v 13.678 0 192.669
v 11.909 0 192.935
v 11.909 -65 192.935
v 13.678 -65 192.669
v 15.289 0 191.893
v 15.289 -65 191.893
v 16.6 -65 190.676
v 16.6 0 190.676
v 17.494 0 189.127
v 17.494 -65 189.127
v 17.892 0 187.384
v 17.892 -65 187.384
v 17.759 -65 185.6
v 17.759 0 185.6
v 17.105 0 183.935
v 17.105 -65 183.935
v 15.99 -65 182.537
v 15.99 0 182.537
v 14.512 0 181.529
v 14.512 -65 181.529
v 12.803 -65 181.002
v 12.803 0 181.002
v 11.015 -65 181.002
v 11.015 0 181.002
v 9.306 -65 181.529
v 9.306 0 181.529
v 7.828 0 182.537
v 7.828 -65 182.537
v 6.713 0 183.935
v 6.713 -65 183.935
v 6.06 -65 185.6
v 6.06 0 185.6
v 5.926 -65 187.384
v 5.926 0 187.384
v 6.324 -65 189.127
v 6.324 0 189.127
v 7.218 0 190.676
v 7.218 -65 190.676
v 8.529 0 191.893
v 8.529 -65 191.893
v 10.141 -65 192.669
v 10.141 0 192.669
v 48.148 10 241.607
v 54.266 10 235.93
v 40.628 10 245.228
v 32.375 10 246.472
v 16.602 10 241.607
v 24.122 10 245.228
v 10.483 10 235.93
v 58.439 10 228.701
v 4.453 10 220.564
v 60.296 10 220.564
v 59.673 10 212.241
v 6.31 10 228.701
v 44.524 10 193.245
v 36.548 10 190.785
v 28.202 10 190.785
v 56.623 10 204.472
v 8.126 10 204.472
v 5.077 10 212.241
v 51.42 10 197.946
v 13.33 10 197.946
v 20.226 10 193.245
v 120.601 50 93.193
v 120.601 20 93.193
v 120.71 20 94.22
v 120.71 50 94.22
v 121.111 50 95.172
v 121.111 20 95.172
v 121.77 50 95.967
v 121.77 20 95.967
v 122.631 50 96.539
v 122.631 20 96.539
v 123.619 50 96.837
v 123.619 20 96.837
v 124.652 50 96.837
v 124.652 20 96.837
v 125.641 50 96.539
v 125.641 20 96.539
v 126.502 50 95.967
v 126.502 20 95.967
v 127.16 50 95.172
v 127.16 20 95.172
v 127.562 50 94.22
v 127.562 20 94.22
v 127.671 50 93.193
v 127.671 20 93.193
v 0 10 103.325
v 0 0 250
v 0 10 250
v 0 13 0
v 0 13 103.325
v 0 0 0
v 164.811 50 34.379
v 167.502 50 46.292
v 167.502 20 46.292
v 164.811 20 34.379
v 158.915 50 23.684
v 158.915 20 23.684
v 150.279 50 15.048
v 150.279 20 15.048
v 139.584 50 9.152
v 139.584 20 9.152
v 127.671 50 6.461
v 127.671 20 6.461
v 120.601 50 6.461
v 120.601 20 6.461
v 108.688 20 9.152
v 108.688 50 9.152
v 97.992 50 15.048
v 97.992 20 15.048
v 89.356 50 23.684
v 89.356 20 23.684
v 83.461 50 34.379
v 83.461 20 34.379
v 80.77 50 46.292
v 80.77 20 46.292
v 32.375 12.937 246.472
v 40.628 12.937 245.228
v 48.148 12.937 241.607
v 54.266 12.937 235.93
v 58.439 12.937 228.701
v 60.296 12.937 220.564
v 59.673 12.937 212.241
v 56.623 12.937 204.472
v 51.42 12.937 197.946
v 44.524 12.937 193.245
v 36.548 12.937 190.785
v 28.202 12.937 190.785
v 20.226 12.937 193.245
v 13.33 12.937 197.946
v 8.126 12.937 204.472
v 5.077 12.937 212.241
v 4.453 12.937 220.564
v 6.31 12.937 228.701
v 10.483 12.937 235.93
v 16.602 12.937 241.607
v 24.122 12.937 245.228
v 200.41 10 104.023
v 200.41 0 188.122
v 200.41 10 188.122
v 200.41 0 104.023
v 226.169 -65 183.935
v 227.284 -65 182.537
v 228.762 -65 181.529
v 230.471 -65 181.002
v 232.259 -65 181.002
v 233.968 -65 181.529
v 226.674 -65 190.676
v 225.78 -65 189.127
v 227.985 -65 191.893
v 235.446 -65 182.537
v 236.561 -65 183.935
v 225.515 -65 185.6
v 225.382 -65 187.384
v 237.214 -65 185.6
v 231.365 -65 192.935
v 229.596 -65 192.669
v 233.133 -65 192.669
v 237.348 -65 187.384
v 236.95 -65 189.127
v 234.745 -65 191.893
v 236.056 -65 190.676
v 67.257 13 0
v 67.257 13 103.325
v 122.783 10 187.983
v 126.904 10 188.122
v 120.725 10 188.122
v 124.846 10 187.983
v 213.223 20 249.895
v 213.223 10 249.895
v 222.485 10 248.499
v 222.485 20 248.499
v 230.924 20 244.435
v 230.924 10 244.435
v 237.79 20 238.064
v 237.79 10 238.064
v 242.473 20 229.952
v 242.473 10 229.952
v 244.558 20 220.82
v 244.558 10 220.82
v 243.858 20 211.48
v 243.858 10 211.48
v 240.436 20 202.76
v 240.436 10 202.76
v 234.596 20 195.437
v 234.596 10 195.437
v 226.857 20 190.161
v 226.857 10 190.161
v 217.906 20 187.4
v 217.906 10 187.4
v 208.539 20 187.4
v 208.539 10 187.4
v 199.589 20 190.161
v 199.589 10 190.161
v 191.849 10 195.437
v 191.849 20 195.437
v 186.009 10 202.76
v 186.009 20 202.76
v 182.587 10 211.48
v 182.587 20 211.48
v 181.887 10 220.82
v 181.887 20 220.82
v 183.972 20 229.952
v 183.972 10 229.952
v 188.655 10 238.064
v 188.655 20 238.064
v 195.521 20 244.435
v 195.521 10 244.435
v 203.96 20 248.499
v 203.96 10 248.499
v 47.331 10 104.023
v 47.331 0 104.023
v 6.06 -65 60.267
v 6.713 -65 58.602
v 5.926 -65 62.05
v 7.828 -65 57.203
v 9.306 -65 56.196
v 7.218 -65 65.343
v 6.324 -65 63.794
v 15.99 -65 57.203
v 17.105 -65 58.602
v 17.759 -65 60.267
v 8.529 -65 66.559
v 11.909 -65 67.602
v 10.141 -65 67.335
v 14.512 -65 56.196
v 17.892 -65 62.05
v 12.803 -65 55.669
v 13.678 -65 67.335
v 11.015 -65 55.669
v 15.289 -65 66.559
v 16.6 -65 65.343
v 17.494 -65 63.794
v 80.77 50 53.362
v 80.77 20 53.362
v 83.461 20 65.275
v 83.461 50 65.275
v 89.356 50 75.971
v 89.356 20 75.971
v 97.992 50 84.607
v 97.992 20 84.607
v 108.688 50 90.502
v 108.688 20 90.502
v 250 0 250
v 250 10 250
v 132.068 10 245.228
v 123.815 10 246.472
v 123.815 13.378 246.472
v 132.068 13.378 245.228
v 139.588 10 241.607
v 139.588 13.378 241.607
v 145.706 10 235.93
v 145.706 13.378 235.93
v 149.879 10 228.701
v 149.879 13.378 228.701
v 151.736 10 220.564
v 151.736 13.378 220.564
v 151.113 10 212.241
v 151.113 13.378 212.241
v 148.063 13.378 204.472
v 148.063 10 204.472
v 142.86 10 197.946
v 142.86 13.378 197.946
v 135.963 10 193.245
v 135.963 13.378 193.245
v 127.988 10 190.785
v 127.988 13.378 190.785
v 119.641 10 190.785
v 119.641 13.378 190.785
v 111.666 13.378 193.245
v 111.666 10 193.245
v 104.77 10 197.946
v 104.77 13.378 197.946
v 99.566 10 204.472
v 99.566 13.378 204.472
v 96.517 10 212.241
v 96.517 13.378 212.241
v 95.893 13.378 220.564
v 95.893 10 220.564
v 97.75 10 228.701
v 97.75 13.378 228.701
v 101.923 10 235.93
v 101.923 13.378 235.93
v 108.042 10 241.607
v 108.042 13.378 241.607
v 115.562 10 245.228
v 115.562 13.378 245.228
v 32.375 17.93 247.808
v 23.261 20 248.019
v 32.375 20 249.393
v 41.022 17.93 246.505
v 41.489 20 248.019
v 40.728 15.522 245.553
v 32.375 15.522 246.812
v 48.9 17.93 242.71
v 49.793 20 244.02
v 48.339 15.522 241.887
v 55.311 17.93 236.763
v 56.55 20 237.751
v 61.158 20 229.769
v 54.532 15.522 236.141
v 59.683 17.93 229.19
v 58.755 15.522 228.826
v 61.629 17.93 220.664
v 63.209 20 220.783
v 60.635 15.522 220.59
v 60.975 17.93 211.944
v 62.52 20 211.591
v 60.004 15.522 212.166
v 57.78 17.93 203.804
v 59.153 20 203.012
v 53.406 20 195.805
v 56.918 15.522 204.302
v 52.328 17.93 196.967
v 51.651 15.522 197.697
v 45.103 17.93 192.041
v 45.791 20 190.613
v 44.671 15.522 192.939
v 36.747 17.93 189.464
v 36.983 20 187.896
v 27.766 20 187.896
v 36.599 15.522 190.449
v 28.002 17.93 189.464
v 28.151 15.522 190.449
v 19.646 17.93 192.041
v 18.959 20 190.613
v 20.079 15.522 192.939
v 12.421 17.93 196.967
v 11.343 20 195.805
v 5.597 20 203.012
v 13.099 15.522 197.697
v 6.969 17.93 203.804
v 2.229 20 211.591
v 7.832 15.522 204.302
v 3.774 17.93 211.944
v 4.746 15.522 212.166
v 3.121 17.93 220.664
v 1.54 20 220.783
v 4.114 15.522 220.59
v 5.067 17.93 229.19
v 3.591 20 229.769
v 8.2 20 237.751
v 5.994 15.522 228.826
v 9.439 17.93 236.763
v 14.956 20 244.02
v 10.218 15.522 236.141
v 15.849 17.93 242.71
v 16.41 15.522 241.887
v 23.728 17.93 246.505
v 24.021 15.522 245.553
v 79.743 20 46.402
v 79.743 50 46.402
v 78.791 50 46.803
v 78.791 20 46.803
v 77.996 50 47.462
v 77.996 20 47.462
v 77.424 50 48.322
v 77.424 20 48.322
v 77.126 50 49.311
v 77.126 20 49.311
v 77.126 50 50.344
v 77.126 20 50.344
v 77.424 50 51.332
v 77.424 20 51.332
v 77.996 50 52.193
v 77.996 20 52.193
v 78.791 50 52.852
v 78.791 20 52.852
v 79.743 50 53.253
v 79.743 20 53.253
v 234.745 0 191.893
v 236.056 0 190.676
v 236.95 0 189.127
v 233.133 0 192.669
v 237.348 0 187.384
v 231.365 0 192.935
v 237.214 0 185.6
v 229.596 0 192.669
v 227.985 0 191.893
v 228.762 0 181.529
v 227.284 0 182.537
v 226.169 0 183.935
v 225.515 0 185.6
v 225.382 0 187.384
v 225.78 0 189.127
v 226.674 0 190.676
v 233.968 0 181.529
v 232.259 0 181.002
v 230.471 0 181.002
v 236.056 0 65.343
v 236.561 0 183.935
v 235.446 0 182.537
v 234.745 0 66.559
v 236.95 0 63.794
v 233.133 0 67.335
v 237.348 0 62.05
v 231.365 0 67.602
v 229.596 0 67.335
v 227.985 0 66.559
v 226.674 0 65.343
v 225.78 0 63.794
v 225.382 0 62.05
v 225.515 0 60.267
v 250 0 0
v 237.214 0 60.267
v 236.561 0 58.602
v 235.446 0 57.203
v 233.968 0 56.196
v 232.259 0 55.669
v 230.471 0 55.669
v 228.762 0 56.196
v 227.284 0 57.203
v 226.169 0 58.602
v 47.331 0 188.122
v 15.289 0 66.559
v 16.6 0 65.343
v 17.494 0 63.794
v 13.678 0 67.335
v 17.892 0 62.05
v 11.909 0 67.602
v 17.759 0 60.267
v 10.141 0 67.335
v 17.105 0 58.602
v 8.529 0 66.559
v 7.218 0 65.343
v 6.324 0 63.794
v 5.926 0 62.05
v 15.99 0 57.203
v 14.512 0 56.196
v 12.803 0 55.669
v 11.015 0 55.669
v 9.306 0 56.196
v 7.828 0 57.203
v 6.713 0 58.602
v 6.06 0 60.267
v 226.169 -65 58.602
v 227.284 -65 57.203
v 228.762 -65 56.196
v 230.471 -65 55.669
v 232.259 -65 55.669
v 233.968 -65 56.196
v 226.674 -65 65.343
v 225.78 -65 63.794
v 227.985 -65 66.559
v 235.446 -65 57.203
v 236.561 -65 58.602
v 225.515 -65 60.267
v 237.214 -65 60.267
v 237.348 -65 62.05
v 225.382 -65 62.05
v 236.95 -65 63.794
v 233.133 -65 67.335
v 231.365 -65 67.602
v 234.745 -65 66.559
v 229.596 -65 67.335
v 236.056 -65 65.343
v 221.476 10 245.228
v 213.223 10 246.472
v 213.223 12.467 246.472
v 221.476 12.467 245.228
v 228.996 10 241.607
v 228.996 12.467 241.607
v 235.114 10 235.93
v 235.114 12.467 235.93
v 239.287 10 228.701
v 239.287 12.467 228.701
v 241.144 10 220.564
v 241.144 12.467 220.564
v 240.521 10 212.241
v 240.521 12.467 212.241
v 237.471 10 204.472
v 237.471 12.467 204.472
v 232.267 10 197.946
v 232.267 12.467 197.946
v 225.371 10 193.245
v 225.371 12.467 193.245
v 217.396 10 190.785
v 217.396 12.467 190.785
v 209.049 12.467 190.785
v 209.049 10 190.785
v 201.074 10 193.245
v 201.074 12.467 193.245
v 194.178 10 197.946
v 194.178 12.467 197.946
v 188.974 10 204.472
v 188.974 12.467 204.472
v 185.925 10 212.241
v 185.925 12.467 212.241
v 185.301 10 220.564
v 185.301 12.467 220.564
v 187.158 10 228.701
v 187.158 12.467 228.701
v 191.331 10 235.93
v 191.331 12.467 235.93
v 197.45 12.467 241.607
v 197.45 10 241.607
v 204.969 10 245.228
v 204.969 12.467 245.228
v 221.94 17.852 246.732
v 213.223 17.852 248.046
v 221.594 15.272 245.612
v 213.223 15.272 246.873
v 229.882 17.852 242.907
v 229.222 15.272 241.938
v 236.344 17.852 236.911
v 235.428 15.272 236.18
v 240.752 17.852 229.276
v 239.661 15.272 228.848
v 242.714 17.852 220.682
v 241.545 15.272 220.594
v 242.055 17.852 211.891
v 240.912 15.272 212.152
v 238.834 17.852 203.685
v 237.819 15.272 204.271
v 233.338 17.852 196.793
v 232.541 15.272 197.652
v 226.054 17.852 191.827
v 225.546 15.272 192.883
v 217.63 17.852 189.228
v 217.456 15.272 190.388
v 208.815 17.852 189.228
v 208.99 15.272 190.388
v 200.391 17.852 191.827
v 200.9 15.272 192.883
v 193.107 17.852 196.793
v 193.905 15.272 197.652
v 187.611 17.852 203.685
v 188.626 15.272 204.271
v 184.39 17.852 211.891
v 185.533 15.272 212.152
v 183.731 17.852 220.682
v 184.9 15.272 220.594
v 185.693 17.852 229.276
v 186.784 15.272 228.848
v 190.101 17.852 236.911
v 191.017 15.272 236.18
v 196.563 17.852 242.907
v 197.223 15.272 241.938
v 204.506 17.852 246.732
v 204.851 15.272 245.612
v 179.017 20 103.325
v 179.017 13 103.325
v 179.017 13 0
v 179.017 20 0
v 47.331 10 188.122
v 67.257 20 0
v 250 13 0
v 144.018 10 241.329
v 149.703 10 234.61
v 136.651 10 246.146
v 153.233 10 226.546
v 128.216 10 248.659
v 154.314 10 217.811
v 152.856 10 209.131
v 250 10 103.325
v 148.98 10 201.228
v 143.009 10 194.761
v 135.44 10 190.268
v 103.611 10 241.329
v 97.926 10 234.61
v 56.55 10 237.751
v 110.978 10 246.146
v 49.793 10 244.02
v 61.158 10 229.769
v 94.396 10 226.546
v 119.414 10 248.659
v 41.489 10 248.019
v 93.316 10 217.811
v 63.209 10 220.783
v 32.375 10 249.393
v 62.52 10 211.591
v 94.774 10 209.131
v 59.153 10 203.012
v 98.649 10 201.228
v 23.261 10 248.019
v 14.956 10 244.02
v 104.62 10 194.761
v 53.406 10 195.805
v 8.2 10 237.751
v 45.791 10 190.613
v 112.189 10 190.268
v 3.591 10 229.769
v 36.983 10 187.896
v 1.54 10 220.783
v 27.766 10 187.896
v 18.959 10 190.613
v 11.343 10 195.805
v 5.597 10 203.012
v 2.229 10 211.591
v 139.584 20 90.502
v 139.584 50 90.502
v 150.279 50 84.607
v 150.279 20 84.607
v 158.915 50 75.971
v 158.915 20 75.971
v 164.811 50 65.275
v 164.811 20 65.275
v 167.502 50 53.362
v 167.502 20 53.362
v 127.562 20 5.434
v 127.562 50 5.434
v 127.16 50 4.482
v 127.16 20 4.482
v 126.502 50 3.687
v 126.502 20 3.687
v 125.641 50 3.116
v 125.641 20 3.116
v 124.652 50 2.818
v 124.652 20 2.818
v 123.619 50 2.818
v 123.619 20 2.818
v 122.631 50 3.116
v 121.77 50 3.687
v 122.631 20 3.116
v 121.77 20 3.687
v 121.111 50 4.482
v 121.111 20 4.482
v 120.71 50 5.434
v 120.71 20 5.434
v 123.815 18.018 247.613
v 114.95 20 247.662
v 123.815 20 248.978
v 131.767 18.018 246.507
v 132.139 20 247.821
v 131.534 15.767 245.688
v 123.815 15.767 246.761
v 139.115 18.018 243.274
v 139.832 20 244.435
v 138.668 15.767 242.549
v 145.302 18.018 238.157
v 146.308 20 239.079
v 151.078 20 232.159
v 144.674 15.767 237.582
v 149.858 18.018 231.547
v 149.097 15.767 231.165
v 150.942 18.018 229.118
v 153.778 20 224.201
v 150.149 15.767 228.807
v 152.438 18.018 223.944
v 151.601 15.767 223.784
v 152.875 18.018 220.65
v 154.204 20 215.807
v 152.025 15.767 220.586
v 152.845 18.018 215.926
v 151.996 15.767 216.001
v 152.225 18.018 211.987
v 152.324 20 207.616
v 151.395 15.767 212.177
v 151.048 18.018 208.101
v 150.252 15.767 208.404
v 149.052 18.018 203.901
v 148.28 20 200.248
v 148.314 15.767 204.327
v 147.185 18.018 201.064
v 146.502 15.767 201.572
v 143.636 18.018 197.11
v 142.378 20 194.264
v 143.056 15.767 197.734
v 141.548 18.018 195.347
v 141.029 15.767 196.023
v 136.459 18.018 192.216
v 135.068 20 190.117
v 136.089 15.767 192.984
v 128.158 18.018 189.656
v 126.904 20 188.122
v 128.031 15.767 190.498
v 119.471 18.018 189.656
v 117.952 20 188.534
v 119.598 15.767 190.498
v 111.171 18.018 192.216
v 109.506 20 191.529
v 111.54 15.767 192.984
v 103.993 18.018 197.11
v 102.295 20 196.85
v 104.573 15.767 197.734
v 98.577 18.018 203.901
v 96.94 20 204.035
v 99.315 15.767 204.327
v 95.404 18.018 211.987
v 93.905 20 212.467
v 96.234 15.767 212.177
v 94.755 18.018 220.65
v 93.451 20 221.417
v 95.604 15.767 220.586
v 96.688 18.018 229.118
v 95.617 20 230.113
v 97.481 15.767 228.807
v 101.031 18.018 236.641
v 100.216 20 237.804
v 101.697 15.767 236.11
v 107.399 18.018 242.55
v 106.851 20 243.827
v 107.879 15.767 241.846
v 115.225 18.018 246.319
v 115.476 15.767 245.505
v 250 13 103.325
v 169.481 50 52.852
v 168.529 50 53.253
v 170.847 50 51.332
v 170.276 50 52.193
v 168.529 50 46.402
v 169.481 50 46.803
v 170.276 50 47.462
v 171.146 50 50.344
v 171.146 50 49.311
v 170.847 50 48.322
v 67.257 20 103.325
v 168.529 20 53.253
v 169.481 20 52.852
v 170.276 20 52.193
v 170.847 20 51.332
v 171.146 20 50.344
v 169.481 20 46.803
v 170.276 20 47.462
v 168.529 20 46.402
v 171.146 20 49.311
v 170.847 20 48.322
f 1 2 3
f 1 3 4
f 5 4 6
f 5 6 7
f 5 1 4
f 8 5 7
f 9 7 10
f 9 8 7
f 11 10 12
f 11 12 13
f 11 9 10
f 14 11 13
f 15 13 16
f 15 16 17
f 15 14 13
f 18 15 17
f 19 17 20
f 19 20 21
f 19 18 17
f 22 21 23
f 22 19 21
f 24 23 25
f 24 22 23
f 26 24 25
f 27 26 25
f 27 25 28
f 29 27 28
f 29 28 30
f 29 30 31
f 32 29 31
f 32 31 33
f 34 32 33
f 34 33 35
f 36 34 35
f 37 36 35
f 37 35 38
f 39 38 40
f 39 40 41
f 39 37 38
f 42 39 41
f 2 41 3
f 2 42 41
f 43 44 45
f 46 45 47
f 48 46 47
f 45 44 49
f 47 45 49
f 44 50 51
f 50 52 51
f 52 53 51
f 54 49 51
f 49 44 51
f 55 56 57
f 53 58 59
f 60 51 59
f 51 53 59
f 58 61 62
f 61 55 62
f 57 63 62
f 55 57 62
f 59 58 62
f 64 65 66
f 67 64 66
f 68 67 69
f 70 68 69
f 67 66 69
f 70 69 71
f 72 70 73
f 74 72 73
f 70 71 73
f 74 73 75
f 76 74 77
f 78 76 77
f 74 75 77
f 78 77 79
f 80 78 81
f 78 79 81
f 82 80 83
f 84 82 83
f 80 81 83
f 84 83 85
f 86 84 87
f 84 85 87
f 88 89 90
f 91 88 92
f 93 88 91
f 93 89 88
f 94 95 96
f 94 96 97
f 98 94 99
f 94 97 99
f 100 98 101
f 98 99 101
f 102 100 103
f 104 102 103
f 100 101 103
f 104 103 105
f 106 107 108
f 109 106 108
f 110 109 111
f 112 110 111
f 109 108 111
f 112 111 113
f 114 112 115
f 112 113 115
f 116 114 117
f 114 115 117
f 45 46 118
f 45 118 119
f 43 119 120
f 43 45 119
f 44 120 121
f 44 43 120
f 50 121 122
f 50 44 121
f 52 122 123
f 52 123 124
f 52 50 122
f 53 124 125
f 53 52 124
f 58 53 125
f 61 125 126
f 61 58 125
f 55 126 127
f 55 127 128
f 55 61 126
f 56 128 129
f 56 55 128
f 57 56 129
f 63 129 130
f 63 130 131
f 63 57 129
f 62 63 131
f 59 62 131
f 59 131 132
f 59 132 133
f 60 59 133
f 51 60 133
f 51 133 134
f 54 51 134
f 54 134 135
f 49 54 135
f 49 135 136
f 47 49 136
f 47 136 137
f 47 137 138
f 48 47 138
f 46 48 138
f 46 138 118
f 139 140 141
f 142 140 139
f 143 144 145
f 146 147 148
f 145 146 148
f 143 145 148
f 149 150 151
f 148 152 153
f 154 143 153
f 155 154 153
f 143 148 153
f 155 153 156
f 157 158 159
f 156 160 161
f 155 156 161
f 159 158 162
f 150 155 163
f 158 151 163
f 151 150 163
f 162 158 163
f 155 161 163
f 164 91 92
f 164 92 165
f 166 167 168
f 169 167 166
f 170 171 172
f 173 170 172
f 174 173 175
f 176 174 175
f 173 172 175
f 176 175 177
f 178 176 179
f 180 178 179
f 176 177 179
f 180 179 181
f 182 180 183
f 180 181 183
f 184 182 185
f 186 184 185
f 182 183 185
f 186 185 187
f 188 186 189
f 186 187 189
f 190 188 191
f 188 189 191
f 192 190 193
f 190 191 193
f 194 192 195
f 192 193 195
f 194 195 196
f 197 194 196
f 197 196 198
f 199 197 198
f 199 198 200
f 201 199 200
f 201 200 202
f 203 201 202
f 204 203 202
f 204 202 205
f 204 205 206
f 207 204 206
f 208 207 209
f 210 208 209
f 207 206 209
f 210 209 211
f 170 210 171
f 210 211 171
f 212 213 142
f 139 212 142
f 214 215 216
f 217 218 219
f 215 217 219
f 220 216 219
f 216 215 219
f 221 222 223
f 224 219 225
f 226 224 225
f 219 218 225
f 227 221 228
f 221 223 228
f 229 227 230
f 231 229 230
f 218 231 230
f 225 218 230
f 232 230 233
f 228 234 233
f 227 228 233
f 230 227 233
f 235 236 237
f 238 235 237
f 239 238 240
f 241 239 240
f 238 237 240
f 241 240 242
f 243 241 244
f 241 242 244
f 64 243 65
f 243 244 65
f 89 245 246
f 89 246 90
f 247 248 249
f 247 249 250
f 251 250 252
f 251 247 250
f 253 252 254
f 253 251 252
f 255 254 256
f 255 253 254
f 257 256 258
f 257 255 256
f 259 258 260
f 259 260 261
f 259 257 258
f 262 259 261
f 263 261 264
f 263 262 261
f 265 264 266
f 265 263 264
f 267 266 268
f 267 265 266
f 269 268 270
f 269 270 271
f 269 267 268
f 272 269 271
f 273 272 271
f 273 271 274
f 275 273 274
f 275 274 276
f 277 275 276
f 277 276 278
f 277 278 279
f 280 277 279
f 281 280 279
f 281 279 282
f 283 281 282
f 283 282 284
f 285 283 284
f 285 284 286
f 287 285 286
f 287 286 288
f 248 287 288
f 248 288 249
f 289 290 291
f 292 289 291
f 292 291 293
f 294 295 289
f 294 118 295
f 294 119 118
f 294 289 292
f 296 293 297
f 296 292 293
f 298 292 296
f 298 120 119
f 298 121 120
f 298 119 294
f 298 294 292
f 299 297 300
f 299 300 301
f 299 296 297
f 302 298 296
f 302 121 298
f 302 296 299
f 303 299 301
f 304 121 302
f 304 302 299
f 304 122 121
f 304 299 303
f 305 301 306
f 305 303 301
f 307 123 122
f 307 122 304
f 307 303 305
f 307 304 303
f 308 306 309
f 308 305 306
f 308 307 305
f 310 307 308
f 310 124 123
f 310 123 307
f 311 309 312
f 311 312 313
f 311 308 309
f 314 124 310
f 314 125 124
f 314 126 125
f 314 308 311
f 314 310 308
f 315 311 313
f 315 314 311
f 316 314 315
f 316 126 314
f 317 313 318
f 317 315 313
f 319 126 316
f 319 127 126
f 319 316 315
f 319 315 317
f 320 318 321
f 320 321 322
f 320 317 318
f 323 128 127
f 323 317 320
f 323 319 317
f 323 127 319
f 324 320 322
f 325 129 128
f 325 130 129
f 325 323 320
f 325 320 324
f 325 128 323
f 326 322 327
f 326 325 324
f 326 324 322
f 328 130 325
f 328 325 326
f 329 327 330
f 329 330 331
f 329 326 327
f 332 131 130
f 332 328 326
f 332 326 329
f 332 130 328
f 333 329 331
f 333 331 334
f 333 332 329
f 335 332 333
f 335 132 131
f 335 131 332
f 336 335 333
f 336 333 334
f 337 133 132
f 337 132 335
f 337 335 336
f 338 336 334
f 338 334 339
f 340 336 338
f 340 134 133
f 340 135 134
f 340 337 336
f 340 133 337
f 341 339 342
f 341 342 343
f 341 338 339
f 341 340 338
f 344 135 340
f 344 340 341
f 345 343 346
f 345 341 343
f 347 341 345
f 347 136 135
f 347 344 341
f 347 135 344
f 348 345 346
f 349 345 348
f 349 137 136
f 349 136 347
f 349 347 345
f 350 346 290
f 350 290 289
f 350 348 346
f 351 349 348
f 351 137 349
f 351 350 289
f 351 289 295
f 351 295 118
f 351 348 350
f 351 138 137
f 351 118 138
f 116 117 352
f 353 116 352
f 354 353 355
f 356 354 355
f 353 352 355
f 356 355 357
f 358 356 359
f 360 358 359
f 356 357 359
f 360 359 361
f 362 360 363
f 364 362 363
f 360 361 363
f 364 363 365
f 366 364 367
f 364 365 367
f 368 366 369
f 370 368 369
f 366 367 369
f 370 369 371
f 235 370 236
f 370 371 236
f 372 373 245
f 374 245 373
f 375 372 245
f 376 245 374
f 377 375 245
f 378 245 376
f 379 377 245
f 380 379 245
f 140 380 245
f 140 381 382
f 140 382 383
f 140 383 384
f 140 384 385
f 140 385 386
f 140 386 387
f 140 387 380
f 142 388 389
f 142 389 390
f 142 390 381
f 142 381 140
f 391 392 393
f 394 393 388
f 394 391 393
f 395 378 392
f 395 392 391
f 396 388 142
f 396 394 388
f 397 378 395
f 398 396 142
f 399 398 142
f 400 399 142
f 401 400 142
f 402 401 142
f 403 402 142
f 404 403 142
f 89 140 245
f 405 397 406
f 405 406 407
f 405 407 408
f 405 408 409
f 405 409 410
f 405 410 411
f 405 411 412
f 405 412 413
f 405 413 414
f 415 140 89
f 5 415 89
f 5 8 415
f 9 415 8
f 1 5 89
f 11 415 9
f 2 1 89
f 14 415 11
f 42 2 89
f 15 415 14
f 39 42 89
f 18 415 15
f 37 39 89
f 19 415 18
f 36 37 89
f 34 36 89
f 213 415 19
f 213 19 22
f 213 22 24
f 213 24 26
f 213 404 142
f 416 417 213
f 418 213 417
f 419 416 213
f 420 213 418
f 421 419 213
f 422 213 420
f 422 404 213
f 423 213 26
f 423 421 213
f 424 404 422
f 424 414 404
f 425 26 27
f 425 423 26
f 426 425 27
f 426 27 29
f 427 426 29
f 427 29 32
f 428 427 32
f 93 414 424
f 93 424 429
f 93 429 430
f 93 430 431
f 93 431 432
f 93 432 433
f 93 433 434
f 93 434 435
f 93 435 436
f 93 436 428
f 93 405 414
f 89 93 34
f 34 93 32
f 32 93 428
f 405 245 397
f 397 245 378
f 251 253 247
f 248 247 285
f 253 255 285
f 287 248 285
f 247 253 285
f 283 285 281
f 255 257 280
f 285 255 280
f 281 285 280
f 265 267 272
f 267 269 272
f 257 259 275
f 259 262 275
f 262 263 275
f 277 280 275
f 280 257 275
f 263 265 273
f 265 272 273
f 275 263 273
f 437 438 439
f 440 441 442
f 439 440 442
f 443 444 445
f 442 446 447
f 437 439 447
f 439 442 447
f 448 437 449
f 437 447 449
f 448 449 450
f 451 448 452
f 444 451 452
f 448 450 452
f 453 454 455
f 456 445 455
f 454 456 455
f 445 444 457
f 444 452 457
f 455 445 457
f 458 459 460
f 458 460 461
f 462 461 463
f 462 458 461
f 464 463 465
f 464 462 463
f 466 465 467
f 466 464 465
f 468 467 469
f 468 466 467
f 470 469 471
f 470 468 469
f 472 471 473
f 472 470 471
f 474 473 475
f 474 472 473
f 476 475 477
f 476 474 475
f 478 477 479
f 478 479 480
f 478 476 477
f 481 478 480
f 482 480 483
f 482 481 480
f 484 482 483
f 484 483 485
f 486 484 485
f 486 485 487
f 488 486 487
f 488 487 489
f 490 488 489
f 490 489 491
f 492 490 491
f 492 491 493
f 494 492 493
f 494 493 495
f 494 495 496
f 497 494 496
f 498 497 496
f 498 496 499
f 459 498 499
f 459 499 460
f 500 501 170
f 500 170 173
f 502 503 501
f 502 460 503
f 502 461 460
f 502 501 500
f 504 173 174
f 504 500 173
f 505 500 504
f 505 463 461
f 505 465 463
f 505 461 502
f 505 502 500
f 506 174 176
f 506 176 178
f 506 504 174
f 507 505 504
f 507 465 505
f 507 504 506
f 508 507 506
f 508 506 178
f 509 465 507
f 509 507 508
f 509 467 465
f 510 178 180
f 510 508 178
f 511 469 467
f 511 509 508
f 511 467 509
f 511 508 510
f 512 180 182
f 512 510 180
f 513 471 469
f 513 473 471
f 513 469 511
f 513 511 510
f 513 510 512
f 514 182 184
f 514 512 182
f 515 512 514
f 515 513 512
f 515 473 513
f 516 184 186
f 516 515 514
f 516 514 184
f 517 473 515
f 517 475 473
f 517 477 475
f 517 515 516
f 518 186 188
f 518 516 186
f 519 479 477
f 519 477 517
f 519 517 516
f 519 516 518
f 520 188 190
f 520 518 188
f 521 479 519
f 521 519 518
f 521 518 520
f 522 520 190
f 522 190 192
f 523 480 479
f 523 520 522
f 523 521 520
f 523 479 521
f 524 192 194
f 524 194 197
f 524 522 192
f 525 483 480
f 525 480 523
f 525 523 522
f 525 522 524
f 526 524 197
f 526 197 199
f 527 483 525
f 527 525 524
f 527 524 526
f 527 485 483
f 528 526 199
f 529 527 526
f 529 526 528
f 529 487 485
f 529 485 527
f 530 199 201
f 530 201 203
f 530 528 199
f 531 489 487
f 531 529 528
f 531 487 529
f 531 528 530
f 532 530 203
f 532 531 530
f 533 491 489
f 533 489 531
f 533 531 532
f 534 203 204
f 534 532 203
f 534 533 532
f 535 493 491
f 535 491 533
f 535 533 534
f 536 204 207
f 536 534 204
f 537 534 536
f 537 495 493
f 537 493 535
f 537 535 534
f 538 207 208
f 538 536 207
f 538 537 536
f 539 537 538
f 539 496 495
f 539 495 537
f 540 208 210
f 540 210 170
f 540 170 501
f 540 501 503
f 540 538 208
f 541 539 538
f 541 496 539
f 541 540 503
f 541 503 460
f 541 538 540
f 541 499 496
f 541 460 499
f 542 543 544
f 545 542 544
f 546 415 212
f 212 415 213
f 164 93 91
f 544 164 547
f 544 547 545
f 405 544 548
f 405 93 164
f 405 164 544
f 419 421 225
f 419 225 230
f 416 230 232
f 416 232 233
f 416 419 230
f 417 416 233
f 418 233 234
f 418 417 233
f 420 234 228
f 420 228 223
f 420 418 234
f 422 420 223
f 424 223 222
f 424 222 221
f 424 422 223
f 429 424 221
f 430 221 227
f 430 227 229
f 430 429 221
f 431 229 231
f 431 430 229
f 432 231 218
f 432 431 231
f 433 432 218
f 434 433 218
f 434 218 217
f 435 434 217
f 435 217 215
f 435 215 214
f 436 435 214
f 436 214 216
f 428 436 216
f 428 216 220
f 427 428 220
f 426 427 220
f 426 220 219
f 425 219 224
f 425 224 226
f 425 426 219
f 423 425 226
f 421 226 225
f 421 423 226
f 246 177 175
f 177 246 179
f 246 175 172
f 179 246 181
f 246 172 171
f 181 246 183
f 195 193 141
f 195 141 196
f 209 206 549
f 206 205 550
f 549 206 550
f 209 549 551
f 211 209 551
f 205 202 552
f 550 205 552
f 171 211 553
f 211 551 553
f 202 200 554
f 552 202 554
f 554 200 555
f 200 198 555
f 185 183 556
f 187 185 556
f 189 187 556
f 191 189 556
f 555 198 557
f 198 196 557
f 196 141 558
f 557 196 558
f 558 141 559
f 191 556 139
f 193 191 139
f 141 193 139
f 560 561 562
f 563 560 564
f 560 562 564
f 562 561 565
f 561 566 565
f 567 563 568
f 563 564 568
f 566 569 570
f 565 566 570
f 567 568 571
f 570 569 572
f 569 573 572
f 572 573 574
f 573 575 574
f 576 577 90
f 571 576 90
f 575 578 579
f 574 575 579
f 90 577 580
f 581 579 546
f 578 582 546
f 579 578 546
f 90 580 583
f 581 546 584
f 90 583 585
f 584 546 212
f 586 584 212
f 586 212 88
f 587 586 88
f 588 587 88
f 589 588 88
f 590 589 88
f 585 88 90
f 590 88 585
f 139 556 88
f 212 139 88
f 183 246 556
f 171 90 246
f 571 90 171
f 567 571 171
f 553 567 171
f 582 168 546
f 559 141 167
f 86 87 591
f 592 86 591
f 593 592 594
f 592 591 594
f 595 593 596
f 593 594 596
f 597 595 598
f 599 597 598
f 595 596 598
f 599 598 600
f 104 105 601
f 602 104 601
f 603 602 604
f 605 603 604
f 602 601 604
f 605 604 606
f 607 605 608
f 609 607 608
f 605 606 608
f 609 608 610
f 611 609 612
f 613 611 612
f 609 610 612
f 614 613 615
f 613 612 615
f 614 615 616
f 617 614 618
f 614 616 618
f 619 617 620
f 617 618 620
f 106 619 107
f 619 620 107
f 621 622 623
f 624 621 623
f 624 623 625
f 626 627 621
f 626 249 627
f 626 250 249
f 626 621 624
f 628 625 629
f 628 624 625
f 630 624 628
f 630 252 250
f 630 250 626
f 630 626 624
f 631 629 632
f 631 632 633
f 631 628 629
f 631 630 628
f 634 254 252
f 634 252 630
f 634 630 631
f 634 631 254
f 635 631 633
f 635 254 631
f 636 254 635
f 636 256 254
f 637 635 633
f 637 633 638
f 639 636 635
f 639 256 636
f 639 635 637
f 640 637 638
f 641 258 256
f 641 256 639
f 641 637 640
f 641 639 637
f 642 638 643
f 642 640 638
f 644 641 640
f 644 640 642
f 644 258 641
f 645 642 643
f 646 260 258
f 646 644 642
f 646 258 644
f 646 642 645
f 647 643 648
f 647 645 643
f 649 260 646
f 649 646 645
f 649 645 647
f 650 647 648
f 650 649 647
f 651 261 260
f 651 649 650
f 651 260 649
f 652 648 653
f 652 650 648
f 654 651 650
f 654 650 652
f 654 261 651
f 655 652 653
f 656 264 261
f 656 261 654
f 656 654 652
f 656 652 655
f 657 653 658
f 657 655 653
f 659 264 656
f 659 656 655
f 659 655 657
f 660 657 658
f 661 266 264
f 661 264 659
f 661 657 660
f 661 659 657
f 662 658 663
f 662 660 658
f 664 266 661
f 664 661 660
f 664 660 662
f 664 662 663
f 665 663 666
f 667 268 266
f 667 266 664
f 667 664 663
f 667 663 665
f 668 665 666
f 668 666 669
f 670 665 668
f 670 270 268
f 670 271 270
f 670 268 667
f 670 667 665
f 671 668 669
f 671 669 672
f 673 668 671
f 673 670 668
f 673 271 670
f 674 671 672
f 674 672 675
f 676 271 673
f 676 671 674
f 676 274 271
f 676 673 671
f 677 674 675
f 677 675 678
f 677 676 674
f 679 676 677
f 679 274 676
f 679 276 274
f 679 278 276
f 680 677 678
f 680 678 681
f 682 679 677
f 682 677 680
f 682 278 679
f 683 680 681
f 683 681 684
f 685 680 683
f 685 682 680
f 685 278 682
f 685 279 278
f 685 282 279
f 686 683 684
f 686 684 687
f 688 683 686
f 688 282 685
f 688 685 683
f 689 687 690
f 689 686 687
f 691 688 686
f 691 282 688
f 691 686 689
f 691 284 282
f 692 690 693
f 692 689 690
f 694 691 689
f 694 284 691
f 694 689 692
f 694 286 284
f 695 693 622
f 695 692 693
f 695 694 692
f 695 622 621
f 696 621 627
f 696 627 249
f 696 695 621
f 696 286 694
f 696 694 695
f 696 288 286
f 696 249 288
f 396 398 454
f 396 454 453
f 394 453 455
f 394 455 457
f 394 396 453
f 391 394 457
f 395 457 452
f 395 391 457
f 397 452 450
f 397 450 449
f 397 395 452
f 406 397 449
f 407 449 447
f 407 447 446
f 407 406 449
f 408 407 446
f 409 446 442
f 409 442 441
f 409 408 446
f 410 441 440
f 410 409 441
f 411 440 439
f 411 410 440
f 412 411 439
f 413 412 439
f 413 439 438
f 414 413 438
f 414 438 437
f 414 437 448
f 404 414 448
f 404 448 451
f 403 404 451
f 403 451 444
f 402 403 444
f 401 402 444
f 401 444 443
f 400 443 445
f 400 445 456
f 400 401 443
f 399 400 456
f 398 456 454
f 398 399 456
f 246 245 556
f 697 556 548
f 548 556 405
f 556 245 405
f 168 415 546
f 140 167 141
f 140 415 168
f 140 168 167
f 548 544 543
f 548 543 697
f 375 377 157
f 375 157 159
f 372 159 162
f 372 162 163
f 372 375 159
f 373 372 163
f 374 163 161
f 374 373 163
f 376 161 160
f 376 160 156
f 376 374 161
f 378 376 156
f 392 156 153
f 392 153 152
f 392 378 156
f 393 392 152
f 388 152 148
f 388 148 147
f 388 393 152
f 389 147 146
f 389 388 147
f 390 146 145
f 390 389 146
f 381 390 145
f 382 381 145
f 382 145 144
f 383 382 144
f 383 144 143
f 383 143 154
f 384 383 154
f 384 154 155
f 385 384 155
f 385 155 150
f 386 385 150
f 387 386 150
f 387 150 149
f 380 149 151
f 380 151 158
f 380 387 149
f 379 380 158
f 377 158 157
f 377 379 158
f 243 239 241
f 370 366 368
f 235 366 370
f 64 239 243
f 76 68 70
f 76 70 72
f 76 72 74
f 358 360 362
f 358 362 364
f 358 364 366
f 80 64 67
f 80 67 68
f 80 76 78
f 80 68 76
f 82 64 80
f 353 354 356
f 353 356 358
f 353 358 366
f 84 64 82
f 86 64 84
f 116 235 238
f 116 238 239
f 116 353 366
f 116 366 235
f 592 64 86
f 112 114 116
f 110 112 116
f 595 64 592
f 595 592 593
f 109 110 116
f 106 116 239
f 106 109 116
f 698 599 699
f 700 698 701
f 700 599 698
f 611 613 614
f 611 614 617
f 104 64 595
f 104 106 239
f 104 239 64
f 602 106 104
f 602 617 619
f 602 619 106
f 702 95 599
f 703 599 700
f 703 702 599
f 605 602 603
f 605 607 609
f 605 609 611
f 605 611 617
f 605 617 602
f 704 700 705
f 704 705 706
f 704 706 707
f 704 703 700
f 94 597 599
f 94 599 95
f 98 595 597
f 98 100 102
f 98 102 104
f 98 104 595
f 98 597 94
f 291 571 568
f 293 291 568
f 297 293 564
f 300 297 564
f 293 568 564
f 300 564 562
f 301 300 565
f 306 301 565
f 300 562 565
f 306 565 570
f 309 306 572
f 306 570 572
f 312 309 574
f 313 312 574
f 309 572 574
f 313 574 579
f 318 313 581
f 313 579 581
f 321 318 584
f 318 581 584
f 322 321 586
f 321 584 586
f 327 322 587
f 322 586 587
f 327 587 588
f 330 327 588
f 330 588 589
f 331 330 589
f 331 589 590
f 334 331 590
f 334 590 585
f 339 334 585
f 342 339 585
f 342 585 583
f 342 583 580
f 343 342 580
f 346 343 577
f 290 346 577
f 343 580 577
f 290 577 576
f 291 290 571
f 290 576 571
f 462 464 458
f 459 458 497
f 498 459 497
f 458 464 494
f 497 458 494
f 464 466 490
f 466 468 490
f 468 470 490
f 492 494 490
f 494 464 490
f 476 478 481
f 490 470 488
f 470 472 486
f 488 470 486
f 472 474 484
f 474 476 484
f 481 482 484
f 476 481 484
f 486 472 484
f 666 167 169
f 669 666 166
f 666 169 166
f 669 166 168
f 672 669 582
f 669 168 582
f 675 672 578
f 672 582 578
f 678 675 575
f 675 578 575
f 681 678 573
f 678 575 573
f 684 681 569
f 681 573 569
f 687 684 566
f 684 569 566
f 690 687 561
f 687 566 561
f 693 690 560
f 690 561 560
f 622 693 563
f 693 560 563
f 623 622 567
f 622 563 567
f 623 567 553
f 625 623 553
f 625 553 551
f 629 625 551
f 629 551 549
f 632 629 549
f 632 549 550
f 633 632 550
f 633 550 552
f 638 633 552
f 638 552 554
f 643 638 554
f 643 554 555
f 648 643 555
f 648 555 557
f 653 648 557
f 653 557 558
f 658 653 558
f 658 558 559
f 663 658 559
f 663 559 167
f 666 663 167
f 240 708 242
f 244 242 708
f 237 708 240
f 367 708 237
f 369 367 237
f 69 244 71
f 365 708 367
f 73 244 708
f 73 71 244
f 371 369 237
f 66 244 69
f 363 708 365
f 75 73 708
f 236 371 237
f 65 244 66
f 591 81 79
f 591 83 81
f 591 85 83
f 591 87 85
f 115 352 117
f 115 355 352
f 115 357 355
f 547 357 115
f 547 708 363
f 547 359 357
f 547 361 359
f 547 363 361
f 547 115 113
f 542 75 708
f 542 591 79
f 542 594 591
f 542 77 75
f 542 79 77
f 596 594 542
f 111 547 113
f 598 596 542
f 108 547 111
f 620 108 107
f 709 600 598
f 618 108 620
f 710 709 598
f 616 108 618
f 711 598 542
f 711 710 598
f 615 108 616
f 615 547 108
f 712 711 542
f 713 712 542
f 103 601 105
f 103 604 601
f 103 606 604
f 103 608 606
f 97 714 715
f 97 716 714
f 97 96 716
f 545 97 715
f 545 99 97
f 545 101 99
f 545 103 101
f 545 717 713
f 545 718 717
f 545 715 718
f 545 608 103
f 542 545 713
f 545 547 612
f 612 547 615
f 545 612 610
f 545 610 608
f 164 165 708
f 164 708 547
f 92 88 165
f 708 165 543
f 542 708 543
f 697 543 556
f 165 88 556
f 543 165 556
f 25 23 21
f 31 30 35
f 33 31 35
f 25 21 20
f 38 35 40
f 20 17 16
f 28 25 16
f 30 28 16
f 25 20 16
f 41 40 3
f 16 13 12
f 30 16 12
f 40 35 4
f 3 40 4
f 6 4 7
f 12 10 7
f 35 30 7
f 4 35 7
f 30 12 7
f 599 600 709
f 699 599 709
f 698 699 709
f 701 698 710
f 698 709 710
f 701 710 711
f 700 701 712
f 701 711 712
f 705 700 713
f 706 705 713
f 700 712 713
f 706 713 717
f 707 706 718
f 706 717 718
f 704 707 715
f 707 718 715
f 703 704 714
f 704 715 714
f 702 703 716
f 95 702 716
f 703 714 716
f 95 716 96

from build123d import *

# Parameters (mm, degrees)
SKETCH_3_W      = 153.07917742657742
SKETCH_3_H      = 84.09905426521841
EXTRUDE_3_DEPTH = 10
SKETCH_4_R      = 5.999999999999998
SKETCH_4_R_2    = 6.000000000000017
SKETCH_4_R_3    = 6
EXTRUDE_4_DEPTH = 65
SKETCH_5_R      = 30.920810944079943
SKETCH_5_R_2    = 27.999999999999996
SKETCH_5_R_3    = 30.50629910833158
SKETCH_5_R_4    = 31.42305288564662
EXTRUDE_5_DEPTH = 10
FILLET_1_R      = 10
SKETCH_6_W      = 249.99999999999997
SKETCH_6_H      = 103.3253548332911
EXTRUDE_6_DEPTH = 3
SKETCH_7_W      = 111.7598891408415
SKETCH_7_H      = 103.3253548332911
EXTRUDE_7_DEPTH = 20
EXTRUDE_8_DEPTH = 30


with BuildPart() as part:
    # 草图3 → 凸台-拉伸3 (new body)
    with BuildSketch(Plane(origin=(0, 0, 0), x_dir=(1, 0, 0), z_dir=(0, 1, 0))):
        Polygon((0, 0), (249.99999999999997, 0), (249.99999999999997, -249.99999999999997), (3.062e-14, -249.99999999999997), align=None)
        with Locations((123.87065697506361, -146.07290630710244)):
            Rectangle(SKETCH_3_W, SKETCH_3_H, mode=Mode.SUBTRACT)
    extrude(amount=EXTRUDE_3_DEPTH)

    # 草图4 → 凸台-拉伸4 (add)
    with BuildSketch(Plane(origin=(0, 0, 0), x_dir=(1, 0, 0), z_dir=(0, 1, 0))):
        with Locations(Location((11.90907445269146, -61.60166288737722, 0), (0, 0, 270))):
            Circle(SKETCH_4_R)
        with Locations(Location((231.3648567656165, -61.60166288737722, 0), (0, 0, 270))):
            Circle(SKETCH_4_R_2)
        with Locations(Location((231.3648567656165, -186.93529856387, 0), (0, 0, 270))):
            Circle(SKETCH_4_R_2)
        with Locations(Location((11.90907445269146, -186.93529856387, 0), (0, 0, 270))):
            Circle(SKETCH_4_R_3)
    extrude(amount=-EXTRUDE_4_DEPTH)

    # 草图5 → 凸台-拉伸5 (add)
    # profile 1 of 3: a face of its own
    with BuildSketch(Plane(origin=(0, 10, 0), x_dir=(1, 0, 0), z_dir=(0, 1, 0))):
        with Locations(Location((32.374758545393455, -218.47190728143076, 0), (0, 0, 270))):
            Circle(SKETCH_5_R)
        with Locations(Location((32.374758545393455, -218.47190728143076, 0), (0, 0, 270))):
            Circle(SKETCH_5_R_2, mode=Mode.SUBTRACT)
    # profile 2 of 3: a face of its own
    with BuildSketch(Plane(origin=(0, 10, 0), x_dir=(1, 0, 0), z_dir=(0, 1, 0))):
        with Locations(Location((123.8146678424456, -218.47190728143076, 0), (0, 0, 84.187846026))):
            Circle(SKETCH_5_R_3)
        with Locations(Location((123.8146678424456, -218.47190728143076, 0), (0, 0, 270))):
            Circle(SKETCH_5_R_2, mode=Mode.SUBTRACT)
    # profile 3 of 3: a face of its own
    with BuildSketch(Plane(origin=(0, 10, 0), x_dir=(1, 0, 0), z_dir=(0, 1, 0))):
        with Locations(Location((213.22257915511878, -218.47190728143076, 0), (0, 0, 270))):
            Circle(SKETCH_5_R_4)
        with Locations(Location((213.22257915511878, -218.47190728143076, 0), (0, 0, 270))):
            Circle(SKETCH_5_R_2, mode=Mode.SUBTRACT)
    extrude(amount=EXTRUDE_5_DEPTH)

    # 圆角1
    # the kernel refuses this fillet: 10 mm, written as the material it takes off along each edge
    with BuildSketch(Plane(origin=(32.374758545393455, 20, 218.47190728143076), x_dir=(-2.5e-16, 0, 1), z_dir=(-1, 0, -2.5e-16))) as fillet_1_piece_1:
        with BuildLine():
            CenterArc((37.99999999999997, -7.062937229690062), FILLET_1_R, 135.06584304394207, 44.93415695605793)
            Line((27.99999999999997, -7.062937229690062), (27.799999999999983, -7.062937229690062))
            Line((27.799999999999983, -7.062937229690062), (27.80000000000001, 0))
            Line((27.80000000000001, 0), (28, 0.1999999999999993))
            ThreePointArc((28, 0.1999999999999993), (29.46040547203998, 0.1999999999999993), (30.77922716296152, 0.14125874459380228))
            Line((30.77922716296152, 0.14125874459380228), (30.920810944079932, 0))
        make_face()
    revolve(axis=Axis((32.374758545393455, 20, 218.47190728143076), (0, 1, 0)), mode=Mode.SUBTRACT)
    with BuildSketch(Plane(origin=(123.8146678424456, 20, 218.47190728143076), x_dir=(0, 0, 1), z_dir=(-1, 0, 0))) as fillet_1_piece_2:
        with BuildLine():
            CenterArc((37.99999999999997, -6.621513946689863), FILLET_1_R, 138.53584249731082, 41.464157502689176)
            Line((27.99999999999997, -6.621513946689863), (27.799999999999983, -6.621513946689863))
            Line((27.799999999999983, -6.621513946689863), (27.80000000000001, 0))
            Line((27.80000000000001, 0), (28, 0.1999999999999993))
            ThreePointArc((28, 0.1999999999999993), (29.253149554165788, 0.1999999999999993), (30.35642509049822, 0.13243027893379278))
            Line((30.35642509049822, 0.13243027893379278), (30.506299108331575, -3.55e-15))
        make_face()
    revolve(axis=Axis((123.8146678424456, 20, 218.47190728143076), (0, 1, 0)), mode=Mode.SUBTRACT)
    with BuildSketch(Plane(origin=(213.22257915511878, 20, 218.47190728143076), x_dir=(0, 0, 1), z_dir=(-1, 0, 0))) as fillet_1_piece_3:
        with BuildLine():
            CenterArc((37.99999999999997, -7.53284585365977), FILLET_1_R, 131.1242944649221, 48.87570553507791)
            Line((27.99999999999997, -7.53284585365977), (27.799999999999983, -7.53284585365977))
            Line((27.799999999999983, -7.53284585365977), (27.80000000000001, 0))
            Line((27.80000000000001, 0), (28, 0.1999999999999993))
            ThreePointArc((28, 0.1999999999999993), (29.711526442823327, 0.1999999999999993), (31.291513943359547, 0.15065691707319573))
            Line((31.291513943359547, 0.15065691707319573), (31.423052885646626, 0))
        make_face()
    revolve(axis=Axis((213.22257915511878, 20, 218.47190728143076), (0, 1, 0)), mode=Mode.SUBTRACT)

    # 草图6 → 凸台-拉伸6 (add)
    with BuildSketch(Plane(origin=(0, 10, 0), x_dir=(1, 0, 0), z_dir=(0, 1, 0))):
        with Locations((124.99999999999999, -51.66267741664555)):
            Rectangle(SKETCH_6_W, SKETCH_6_H)
    extrude(amount=EXTRUDE_6_DEPTH)

    # 草图7 → 凸台-拉伸7 (add)
    with BuildSketch(Plane(origin=(0, 0, 0), x_dir=(1, 0, 0), z_dir=(0, 1, 0))):
        with Locations((123.13733518098593, -51.66267741664555)):
            Rectangle(SKETCH_7_W, SKETCH_7_H)
    extrude(amount=EXTRUDE_7_DEPTH)

    # 草图8 → 凸台-拉伸8 (add)
    with BuildSketch(Plane(origin=(0, 20, 0), x_dir=(1, 0, 0), z_dir=(0, 1, 0))):
        with BuildLine():
            ThreePointArc((80.76980033741471, -53.36203223162917), (93.36972027799136, -80.59335577239693), (120.60104381875912, -93.19327571297359))
            ThreePointArc((120.60104381875912, -93.19327571297359), (124.13583776377907, -96.87481756004797), (127.670631708799, -93.19327571297359))
            ThreePointArc((127.670631708799, -93.19327571297359), (154.90195524956675, -80.59335577239695), (167.50187519014344, -53.3620322316292))
            ThreePointArc((167.50187519014344, -53.3620322316292), (171.18341703721785, -49.82723828660922), (167.50187519014344, -46.29244434158925))
            ThreePointArc((167.50187519014344, -46.29244434158925), (154.90195524956675, -19.06112080082149), (127.670631708799, -6.461200860244869))
            ThreePointArc((127.670631708799, -6.461200860244869), (124.13583776377907, -2.779659013170473), (120.60104381875912, -6.461200860244869))
            ThreePointArc((120.60104381875912, -6.461200860244869), (93.36972027799136, -19.061120800821513), (80.76980033741471, -46.29244434158928))
            ThreePointArc((80.76980033741471, -46.29244434158928), (77.08825849034031, -49.82723828660922), (80.76980033741471, -53.36203223162917))
        make_face()
    extrude(amount=EXTRUDE_8_DEPTH)


solid = part.part
